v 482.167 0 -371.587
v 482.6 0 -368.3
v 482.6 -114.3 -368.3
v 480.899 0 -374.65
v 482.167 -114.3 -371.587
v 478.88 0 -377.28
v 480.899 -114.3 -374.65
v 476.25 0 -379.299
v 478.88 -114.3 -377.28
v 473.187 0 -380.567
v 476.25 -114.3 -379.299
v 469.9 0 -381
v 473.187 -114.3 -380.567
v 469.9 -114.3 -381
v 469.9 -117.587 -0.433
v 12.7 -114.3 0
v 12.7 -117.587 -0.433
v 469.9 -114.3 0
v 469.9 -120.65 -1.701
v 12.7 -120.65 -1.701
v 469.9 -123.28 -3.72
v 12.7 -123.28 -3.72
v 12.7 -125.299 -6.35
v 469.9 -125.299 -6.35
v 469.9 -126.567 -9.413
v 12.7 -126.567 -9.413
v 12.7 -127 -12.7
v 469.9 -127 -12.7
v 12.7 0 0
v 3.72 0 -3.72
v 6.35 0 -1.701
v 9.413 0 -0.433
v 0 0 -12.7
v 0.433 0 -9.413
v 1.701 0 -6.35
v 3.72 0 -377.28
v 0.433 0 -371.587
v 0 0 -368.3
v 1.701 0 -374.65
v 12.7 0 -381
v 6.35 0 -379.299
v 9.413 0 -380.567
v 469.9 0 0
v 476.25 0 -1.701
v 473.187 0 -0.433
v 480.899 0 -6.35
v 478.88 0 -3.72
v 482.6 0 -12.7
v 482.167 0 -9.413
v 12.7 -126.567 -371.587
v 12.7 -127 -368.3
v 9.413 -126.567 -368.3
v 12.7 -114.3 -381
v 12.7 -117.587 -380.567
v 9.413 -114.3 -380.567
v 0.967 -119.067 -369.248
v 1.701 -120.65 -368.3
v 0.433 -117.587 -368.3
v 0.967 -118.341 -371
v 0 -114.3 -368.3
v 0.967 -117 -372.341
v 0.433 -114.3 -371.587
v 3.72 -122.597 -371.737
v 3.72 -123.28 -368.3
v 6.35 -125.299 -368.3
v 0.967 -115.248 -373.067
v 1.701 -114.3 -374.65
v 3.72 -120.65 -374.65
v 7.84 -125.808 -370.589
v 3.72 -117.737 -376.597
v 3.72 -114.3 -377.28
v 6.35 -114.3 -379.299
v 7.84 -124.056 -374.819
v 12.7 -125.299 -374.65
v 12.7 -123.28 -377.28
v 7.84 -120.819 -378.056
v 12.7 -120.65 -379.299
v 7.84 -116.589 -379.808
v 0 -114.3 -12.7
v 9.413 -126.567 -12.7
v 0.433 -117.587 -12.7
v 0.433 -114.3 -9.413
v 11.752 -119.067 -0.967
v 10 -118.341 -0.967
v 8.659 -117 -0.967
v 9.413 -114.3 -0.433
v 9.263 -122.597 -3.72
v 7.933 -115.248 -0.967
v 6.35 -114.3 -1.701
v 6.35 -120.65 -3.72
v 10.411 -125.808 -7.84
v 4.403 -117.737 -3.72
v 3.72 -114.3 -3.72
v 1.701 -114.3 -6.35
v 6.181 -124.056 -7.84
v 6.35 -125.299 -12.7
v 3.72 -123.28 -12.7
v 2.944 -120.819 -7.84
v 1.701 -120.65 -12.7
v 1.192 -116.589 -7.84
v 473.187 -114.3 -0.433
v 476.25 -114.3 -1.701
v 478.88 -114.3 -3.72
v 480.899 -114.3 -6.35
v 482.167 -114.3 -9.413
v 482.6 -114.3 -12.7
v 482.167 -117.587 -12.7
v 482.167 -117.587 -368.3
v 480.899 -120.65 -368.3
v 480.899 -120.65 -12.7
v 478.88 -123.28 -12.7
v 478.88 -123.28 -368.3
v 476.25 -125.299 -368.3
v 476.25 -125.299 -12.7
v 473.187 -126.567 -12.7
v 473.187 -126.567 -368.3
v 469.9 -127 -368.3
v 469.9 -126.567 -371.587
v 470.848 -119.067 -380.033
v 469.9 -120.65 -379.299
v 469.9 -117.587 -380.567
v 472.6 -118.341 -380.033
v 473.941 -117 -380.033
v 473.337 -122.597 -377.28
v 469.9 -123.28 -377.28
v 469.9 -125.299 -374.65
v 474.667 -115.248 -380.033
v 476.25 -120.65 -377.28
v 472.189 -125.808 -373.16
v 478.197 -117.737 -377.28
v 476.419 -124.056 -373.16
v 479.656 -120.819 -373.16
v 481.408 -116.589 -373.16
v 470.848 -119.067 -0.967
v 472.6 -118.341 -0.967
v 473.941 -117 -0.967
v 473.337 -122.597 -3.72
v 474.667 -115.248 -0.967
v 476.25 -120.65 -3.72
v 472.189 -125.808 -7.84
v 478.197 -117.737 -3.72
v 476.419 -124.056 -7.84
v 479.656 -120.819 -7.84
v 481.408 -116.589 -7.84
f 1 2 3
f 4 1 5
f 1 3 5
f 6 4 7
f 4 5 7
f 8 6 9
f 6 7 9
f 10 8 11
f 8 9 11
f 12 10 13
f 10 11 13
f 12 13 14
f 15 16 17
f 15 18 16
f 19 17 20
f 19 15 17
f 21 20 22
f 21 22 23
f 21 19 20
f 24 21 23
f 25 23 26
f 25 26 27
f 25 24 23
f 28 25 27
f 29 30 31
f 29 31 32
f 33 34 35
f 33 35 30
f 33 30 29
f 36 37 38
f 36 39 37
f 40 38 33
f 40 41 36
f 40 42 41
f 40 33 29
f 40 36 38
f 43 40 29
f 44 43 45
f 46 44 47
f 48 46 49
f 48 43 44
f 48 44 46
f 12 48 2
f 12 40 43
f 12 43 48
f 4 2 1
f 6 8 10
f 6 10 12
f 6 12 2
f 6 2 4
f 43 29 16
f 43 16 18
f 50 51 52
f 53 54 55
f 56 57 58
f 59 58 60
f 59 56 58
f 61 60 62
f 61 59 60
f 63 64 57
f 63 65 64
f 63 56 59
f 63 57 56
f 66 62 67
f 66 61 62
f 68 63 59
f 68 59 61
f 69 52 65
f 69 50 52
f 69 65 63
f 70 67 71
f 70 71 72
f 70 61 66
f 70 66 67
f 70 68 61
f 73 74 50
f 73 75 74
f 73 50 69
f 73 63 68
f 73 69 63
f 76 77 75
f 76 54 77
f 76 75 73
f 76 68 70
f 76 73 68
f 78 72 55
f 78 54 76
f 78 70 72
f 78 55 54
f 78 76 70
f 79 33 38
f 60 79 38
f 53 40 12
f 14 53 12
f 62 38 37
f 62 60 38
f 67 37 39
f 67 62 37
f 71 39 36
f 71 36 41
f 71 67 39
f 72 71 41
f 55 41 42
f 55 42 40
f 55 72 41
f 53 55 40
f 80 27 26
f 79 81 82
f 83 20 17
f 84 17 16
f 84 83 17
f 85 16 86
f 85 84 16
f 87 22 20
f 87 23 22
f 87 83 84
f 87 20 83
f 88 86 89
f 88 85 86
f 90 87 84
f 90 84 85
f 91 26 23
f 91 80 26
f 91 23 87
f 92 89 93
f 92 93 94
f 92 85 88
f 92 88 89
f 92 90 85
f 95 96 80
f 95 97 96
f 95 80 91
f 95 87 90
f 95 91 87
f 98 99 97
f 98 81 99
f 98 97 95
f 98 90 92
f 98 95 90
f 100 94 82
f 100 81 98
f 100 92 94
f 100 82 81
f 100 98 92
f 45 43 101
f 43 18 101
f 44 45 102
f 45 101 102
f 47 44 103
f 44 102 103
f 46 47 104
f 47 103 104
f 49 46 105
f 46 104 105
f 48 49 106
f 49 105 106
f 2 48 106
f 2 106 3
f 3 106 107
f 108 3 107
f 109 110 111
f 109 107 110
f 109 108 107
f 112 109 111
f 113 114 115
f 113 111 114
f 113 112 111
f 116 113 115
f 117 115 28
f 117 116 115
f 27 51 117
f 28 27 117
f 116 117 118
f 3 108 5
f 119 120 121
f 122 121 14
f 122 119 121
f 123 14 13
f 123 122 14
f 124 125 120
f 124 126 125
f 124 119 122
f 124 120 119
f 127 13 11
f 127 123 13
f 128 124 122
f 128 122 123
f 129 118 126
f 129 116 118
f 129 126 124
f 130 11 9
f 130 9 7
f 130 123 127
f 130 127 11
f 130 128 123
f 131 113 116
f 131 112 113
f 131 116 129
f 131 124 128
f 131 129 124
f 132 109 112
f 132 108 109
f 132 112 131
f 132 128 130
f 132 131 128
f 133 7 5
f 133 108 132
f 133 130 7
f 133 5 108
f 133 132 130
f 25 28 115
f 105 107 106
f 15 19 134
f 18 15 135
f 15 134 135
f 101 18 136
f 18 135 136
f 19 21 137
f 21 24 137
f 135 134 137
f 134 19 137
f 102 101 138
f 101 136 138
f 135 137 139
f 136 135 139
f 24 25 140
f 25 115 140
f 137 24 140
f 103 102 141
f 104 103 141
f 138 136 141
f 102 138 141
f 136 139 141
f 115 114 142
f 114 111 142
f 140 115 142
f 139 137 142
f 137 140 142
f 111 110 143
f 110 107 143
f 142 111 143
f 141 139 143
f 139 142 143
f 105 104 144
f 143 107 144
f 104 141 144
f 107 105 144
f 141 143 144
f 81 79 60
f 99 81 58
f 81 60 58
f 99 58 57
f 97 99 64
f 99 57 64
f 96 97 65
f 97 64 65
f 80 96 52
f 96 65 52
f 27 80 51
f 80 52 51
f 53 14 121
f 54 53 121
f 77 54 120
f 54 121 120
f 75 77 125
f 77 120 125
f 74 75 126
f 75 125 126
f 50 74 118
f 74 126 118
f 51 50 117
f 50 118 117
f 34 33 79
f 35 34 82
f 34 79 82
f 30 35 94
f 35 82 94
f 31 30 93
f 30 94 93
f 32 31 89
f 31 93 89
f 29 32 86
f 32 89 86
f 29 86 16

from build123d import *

# Parameters (mm, degrees)
SKETCH1_W           = 482.6
SKETCH1_H           = 381
BOSS_EXTRUDE1_DEPTH = 127
FILLET1_R           = 12.7


with BuildPart() as part:
    # Sketch1 → Boss-Extrude1 (new body)
    with BuildSketch(Plane(origin=(0, 0, 0), x_dir=(1, 0, 0), z_dir=(0, 1, 0))):
        with Locations((241.3, 190.5)):
            Rectangle(SKETCH1_W, SKETCH1_H)
    extrude(amount=-BOSS_EXTRUDE1_DEPTH)

    # Fillet1
    fillet1_edges = [part.edges().sort_by_distance(p)[0] for p in [
        (482.6, -127, -190.5),
        (241.3, -127, -381),
        (0, -127, -190.5),
        (241.3, -127, 0),
        (0, -63.5, -381),
        (482.6, -63.5, -381),
        (482.6, -63.5, 0),
        (0, -63.5, 0),
    ]]
    fillet(fillet1_edges, radius=FILLET1_R)


solid = part.part
